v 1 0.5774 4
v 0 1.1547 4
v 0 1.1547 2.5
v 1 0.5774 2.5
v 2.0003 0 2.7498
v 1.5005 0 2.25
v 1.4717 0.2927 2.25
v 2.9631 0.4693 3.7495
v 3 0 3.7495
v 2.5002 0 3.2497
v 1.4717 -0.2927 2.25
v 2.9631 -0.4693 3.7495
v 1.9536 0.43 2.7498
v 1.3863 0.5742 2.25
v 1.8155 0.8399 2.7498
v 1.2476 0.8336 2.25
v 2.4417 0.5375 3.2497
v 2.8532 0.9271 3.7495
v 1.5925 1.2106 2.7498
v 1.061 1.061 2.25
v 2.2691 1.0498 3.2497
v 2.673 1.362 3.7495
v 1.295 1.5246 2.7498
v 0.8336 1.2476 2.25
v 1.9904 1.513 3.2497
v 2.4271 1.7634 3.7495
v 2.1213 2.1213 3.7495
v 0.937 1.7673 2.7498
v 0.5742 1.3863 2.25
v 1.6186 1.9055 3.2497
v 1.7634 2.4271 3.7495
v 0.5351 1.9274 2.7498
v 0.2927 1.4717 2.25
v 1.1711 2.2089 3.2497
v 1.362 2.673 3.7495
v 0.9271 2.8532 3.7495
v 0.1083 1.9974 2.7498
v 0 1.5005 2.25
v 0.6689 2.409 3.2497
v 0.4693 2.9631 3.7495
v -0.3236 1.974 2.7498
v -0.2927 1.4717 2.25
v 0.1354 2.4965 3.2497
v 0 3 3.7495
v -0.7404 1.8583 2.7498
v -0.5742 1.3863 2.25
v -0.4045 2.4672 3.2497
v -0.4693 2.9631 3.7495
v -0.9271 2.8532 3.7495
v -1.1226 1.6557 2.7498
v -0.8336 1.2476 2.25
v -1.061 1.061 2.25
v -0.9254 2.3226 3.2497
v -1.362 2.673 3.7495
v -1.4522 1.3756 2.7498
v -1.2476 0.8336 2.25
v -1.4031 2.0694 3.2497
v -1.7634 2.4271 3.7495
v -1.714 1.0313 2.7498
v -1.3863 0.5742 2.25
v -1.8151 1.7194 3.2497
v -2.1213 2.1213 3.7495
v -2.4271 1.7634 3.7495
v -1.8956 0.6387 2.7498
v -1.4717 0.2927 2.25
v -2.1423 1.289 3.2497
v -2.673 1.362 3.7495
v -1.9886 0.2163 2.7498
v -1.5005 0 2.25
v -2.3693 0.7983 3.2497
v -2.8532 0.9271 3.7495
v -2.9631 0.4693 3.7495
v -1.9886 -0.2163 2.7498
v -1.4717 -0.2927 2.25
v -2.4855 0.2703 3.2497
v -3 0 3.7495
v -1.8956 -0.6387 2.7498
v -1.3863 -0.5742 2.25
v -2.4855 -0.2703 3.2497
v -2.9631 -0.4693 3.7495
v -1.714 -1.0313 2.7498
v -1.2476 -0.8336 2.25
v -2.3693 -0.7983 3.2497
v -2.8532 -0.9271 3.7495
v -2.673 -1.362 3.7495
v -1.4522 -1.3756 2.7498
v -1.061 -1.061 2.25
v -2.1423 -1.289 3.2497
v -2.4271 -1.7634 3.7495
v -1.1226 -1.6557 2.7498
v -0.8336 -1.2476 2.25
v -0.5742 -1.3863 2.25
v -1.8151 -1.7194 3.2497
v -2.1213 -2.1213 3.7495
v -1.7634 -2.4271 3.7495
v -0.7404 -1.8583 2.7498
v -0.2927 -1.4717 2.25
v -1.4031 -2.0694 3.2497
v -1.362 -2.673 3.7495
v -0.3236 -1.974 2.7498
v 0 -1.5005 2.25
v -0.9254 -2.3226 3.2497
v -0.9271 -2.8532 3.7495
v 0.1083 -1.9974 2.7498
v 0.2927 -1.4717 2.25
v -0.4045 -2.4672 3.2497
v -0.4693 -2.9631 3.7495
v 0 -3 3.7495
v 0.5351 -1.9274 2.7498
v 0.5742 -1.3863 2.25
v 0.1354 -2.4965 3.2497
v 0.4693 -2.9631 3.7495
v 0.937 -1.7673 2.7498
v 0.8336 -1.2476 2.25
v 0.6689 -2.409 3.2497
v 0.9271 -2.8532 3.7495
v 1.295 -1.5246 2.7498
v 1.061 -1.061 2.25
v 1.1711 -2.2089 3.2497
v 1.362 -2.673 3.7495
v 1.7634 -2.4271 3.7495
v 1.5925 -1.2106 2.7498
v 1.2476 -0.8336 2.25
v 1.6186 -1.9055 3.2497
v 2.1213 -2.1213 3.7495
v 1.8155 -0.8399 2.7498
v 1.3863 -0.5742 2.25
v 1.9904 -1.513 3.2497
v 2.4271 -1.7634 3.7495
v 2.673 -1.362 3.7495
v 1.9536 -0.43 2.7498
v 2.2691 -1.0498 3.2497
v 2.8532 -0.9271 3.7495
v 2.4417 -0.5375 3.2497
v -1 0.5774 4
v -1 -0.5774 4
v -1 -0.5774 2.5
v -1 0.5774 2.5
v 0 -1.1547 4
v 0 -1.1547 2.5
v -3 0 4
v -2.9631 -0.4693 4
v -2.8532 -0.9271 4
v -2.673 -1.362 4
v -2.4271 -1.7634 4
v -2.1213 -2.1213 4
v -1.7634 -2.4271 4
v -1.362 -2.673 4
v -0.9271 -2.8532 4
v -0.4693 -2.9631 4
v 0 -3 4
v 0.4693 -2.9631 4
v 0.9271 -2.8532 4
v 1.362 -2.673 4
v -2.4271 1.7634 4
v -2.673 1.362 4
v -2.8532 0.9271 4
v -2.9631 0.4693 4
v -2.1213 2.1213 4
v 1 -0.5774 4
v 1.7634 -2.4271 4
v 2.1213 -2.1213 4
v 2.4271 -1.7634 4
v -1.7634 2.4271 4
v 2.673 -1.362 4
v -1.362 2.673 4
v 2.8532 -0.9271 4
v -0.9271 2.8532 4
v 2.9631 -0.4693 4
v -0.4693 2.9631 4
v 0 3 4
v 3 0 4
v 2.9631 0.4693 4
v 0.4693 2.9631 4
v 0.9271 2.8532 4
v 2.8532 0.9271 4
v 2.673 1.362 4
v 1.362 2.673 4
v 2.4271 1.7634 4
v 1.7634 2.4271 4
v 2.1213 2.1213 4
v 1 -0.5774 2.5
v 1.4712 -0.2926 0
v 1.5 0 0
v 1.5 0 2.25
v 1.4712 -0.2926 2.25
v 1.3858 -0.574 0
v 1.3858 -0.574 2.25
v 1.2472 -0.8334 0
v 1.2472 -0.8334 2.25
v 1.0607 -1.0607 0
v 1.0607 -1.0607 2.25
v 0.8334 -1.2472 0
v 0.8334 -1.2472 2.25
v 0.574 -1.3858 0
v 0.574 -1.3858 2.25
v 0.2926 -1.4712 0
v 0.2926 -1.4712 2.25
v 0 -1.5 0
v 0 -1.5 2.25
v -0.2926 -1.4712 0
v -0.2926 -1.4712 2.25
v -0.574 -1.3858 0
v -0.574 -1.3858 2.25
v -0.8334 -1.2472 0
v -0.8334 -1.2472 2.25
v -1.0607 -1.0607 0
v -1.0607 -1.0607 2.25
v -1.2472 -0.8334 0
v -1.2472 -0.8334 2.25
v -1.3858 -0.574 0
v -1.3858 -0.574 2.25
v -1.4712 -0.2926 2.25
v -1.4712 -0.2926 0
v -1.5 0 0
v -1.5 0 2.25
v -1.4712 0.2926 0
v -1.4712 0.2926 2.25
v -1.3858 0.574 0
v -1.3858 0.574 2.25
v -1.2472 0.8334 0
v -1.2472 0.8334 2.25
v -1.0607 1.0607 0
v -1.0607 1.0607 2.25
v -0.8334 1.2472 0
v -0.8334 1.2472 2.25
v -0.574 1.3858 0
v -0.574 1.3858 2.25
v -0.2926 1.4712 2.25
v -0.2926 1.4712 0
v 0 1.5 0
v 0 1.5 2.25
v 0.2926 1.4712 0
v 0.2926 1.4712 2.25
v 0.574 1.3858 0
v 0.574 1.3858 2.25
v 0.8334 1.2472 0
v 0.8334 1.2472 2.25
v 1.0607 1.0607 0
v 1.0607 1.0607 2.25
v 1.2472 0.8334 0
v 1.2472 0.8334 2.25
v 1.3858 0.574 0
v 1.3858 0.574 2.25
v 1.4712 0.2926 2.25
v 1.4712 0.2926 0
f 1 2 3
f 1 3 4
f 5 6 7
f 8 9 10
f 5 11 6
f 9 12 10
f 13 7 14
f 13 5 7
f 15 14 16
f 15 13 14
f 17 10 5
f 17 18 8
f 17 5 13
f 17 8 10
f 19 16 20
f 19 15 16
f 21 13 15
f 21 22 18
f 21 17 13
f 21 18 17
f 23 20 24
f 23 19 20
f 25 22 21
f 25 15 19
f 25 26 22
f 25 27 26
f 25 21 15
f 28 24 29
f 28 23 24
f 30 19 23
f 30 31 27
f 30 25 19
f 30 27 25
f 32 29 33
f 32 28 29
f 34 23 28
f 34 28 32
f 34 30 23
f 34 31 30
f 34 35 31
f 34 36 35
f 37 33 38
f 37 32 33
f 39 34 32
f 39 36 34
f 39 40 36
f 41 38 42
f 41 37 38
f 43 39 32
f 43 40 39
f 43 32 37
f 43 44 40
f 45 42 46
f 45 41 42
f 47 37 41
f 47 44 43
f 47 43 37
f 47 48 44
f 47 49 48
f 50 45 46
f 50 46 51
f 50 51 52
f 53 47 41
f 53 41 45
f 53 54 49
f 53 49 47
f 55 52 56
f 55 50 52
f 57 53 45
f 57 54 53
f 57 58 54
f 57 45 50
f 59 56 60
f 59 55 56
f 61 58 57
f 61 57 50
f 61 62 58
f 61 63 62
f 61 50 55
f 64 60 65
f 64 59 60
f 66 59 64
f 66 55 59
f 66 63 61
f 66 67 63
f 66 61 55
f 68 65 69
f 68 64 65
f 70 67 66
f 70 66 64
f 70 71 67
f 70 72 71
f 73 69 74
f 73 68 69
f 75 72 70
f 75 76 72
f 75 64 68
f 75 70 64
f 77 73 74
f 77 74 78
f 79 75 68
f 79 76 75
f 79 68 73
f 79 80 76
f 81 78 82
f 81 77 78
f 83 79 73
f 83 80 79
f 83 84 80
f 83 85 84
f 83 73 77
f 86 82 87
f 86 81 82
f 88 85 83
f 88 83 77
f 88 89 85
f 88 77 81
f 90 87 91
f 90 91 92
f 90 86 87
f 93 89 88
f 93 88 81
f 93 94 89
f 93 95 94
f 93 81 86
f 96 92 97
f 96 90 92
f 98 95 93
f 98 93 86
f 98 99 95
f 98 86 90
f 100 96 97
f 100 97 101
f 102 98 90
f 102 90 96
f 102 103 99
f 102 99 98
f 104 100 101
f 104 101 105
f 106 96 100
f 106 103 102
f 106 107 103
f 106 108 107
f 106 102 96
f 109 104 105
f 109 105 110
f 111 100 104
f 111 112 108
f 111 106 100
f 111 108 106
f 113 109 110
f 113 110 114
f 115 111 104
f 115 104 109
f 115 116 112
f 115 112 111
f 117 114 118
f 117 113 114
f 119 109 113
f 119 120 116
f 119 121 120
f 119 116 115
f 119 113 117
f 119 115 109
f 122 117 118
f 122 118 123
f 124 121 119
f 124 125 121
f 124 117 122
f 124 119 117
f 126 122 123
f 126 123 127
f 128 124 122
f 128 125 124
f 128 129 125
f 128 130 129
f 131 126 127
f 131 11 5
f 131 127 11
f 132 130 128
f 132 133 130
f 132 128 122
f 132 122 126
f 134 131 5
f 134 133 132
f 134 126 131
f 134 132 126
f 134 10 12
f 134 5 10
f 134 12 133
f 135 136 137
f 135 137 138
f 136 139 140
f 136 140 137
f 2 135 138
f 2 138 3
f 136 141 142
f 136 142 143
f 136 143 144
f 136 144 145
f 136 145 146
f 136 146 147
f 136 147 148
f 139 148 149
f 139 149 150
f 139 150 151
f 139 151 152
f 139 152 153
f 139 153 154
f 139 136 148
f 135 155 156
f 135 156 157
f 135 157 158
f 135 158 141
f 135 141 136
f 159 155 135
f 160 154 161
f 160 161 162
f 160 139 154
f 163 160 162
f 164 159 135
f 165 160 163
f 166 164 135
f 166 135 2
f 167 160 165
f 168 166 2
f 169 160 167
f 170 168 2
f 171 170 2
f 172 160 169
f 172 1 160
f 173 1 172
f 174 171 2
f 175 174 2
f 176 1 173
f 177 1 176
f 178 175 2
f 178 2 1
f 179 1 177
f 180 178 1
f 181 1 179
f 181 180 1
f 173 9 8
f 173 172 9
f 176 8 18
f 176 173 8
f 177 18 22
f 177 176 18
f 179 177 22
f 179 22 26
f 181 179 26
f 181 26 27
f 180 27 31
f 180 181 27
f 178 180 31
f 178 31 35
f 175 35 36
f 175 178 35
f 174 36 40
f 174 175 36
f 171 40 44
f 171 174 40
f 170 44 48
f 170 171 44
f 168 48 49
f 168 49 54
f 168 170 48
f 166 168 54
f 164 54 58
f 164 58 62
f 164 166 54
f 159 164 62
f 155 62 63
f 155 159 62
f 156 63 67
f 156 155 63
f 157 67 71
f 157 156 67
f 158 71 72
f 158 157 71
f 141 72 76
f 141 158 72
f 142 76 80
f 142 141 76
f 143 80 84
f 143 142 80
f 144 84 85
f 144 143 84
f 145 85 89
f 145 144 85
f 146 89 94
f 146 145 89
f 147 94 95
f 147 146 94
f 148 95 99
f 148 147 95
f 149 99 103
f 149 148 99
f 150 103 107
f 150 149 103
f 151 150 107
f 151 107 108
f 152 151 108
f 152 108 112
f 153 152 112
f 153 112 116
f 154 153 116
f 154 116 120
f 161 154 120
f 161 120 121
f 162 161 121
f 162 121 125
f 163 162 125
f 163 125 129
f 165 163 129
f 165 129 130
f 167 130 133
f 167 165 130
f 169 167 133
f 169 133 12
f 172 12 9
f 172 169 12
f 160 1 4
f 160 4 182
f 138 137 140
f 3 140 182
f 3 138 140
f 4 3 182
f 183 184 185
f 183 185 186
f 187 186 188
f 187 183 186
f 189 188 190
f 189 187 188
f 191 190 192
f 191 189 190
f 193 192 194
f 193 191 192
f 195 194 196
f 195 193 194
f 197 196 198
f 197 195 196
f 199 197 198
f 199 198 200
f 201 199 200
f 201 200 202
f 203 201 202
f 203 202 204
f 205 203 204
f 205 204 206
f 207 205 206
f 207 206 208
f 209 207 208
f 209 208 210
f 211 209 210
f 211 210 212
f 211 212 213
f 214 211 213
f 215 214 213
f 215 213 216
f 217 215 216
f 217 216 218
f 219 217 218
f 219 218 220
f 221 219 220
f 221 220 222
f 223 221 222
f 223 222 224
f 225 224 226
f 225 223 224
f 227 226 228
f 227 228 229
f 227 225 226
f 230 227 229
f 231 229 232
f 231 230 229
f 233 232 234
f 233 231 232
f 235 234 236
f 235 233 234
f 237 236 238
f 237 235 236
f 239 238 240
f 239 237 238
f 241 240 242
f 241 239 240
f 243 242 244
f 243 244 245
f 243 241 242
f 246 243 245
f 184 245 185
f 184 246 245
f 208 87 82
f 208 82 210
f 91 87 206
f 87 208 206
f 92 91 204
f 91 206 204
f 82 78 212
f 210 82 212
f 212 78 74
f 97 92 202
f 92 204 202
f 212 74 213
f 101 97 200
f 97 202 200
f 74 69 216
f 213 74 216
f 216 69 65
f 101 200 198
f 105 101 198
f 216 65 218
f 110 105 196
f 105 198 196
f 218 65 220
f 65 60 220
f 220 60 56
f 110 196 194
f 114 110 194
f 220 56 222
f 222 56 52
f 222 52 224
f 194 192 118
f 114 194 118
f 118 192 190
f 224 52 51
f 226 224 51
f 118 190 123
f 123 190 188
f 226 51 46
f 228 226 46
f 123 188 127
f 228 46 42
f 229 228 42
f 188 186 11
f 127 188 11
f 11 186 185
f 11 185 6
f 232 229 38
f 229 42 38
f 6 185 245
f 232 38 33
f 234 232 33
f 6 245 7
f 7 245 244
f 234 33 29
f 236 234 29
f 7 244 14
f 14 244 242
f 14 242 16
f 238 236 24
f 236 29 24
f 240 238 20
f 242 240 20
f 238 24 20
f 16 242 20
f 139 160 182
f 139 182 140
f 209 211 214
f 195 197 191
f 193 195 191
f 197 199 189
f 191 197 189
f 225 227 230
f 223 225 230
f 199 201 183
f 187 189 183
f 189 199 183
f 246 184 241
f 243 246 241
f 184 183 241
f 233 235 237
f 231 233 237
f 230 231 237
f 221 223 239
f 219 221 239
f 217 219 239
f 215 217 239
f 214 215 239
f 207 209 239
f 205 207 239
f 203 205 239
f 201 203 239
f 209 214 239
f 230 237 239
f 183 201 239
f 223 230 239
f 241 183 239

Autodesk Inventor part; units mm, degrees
ref_plane "YZ Plane" through (0, 0, 0) normal (1, 0, 0) x (0, 1, 0)
ref_plane "XZ Plane" through (0, 0, 0) normal (0, 1, 0) x (-1, 0, 0)
ref_plane "XY Plane" through (0, 0, 0) normal (0, 0, 1) x (1, 0, 0)
sketch "スケッチ1" plane through (0, 0, 0) normal (0, 0, 1) x (1, 0, 0)
  circle A0 centre (0, 0) radius 1.5
  dimension "d0" = 3
extrude "押し出し1" add sketch "スケッチ1" along normal blind 4
thread "ねじ1" size "M3x0.5" class "6g" standard "ANSI Metric M Profile" full length
sketch "スケッチ2" plane through (0, 0, 4) normal (0, 0, 1) x (1, 0, 0)
  circle A0 centre (0, 0) radius 3
  dimension "d5" = 6
extrude "押し出し2" add sketch "スケッチ2" against normal blind 1.75
chamfer "面取り1" distance 1.5 angle 45 1 edges at (-3, 0, 2.25)
sketch "スケッチ3" plane through (0, 0, 4) normal (0, 0, 1) x (1, 0, 0)
  line L0 (0, 1.1547) -> (1, 0.5774)
  line L1 (1, 0.5774) -> (1, -0.5774)
  line L2 (1, -0.5774) -> (0, -1.1547)
  line L3 (0, -1.1547) -> (-1, -0.5774)
  line L4 (-1, -0.5774) -> (-1, 0.5774)
  line L5 (-1, 0.5774) -> (0, 1.1547)
  point P0 (0, 0)
  point P1 (0, 0)
  dimension "d11" = 2
extrude "押し出し3" cut sketch "スケッチ3" against normal blind 1.5
properties part number "m3皿ネジ4" material "鉄 灰色"
